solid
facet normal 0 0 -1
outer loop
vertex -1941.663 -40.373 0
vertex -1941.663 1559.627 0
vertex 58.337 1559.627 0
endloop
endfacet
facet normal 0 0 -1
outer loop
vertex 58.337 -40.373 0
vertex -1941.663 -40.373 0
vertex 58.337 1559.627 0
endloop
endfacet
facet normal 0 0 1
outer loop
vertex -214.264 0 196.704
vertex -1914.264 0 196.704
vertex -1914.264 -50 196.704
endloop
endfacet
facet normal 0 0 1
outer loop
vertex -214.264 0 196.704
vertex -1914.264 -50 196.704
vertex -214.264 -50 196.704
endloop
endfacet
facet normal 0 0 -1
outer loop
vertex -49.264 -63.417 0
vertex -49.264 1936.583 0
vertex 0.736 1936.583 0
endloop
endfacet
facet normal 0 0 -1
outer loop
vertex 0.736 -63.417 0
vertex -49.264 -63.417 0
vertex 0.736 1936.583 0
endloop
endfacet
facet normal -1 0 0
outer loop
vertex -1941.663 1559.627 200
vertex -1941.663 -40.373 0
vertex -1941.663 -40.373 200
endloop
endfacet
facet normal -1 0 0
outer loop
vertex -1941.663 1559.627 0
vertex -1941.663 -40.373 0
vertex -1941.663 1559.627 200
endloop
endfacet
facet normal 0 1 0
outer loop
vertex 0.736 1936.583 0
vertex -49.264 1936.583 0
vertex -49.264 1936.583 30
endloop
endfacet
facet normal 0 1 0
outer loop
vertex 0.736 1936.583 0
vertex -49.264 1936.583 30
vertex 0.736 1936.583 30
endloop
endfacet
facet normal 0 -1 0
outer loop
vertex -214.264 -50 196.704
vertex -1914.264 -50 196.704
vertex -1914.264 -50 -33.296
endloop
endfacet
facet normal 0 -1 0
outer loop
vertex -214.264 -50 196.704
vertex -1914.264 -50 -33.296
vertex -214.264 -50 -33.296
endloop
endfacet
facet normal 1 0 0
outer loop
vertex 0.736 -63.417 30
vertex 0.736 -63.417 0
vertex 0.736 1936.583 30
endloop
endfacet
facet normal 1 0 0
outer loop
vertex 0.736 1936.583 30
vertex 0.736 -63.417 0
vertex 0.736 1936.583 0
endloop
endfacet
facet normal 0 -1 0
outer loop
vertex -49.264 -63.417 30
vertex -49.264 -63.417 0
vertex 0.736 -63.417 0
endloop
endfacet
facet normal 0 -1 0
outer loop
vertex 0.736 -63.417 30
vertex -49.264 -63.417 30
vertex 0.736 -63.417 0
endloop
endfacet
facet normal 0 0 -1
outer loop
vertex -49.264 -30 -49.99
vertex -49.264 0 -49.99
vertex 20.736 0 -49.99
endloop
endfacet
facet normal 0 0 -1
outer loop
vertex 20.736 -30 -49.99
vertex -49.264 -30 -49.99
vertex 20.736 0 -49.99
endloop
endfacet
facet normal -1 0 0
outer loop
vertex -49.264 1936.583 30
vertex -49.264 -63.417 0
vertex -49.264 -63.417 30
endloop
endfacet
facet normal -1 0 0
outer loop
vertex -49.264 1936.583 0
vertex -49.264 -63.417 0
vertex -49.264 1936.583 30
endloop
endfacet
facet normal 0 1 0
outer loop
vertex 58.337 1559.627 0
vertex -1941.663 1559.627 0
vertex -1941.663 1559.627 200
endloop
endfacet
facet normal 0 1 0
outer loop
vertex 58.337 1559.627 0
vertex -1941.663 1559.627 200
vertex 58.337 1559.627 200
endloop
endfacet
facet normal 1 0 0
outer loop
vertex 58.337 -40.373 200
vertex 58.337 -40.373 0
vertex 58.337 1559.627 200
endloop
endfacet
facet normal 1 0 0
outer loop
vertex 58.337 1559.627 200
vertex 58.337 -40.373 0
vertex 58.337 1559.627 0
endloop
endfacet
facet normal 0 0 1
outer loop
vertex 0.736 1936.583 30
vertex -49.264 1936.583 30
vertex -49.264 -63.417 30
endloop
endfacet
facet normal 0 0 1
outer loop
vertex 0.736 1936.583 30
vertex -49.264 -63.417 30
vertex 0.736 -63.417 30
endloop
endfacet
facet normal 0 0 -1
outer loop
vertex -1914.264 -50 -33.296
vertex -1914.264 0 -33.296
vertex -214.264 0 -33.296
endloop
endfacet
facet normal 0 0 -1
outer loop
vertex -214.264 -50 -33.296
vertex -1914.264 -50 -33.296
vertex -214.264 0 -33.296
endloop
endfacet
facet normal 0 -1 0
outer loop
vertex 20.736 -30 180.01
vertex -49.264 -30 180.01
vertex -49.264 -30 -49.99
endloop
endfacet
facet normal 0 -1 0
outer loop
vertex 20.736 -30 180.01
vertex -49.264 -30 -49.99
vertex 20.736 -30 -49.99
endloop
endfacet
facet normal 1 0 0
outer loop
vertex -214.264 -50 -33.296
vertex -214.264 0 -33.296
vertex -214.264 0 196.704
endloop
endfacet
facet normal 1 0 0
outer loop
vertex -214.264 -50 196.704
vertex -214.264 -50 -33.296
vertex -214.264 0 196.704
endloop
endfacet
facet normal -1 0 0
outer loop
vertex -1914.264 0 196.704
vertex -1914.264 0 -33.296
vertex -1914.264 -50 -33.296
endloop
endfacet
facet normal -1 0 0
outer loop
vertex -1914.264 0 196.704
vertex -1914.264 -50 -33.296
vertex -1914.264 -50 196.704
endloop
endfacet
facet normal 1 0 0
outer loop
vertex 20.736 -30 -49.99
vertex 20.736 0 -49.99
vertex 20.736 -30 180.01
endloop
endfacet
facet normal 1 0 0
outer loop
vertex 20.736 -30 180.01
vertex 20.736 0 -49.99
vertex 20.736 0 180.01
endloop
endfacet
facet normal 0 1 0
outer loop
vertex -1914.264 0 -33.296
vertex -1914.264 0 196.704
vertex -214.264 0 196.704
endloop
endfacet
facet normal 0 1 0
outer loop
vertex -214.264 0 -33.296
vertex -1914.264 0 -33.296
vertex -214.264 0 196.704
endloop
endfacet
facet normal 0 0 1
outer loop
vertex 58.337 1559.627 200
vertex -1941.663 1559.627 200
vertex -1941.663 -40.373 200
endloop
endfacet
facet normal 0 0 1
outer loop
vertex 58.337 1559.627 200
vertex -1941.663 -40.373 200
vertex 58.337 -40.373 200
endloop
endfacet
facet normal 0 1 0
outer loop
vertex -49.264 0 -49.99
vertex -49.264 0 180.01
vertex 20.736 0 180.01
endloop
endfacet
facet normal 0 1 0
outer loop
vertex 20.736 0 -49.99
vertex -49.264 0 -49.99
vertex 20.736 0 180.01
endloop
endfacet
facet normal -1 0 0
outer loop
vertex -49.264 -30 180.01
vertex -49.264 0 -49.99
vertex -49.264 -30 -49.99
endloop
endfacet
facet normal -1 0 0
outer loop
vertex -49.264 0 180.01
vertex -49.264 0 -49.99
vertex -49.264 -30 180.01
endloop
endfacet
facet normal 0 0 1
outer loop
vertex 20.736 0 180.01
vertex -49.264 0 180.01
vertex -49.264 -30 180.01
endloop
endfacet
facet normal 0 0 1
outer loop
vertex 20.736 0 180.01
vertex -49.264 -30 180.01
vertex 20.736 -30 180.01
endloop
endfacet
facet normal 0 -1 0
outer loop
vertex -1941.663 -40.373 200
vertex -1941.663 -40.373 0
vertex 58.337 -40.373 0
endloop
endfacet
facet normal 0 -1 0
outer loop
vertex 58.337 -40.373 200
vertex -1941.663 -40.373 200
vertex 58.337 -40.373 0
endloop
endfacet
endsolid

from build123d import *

# Parameters (mm, degrees)
F0_W     = 1700
F0_H     = 230
F1_DEPTH = 50
F2_W     = 50
F2_H     = 2000
F3_DEPTH = 30
F4_W     = 70
F4_H     = 230
F5_DEPTH = 30
F6_W     = 2000
F6_H     = 1600
F7_DEPTH = 200


with BuildPart() as f1:
    # F0 (on Front) → F1 (new body)
    with BuildSketch(Plane.XZ):
        with Locations((-1064.264105, 81.703627)):
            Rectangle(F0_W, F0_H)
    extrude(amount=F1_DEPTH)


with BuildPart() as f3:
    # F2 (on Top) → F3 (new body)
    with BuildSketch(Plane.XY):
        with Locations((-24.264114, 936.582662)):
            Rectangle(F2_W, F2_H)
    extrude(amount=F3_DEPTH)


with BuildPart() as f5:
    # F4 (on Front) → F5 (new body)
    with BuildSketch(Plane.XZ):
        with Locations((-14.264114, 65.01008)):
            Rectangle(F4_W, F4_H)
    extrude(amount=F5_DEPTH)


with BuildPart() as f7:
    # F6 (on Top) → F7 (new body)
    with BuildSketch(Plane.XY):
        with Locations((-941.663302, 759.627017)):
            Rectangle(F6_W, F6_H)
    extrude(amount=F7_DEPTH)


solid = Compound([f1.part, f3.part, f5.part, f7.part])
